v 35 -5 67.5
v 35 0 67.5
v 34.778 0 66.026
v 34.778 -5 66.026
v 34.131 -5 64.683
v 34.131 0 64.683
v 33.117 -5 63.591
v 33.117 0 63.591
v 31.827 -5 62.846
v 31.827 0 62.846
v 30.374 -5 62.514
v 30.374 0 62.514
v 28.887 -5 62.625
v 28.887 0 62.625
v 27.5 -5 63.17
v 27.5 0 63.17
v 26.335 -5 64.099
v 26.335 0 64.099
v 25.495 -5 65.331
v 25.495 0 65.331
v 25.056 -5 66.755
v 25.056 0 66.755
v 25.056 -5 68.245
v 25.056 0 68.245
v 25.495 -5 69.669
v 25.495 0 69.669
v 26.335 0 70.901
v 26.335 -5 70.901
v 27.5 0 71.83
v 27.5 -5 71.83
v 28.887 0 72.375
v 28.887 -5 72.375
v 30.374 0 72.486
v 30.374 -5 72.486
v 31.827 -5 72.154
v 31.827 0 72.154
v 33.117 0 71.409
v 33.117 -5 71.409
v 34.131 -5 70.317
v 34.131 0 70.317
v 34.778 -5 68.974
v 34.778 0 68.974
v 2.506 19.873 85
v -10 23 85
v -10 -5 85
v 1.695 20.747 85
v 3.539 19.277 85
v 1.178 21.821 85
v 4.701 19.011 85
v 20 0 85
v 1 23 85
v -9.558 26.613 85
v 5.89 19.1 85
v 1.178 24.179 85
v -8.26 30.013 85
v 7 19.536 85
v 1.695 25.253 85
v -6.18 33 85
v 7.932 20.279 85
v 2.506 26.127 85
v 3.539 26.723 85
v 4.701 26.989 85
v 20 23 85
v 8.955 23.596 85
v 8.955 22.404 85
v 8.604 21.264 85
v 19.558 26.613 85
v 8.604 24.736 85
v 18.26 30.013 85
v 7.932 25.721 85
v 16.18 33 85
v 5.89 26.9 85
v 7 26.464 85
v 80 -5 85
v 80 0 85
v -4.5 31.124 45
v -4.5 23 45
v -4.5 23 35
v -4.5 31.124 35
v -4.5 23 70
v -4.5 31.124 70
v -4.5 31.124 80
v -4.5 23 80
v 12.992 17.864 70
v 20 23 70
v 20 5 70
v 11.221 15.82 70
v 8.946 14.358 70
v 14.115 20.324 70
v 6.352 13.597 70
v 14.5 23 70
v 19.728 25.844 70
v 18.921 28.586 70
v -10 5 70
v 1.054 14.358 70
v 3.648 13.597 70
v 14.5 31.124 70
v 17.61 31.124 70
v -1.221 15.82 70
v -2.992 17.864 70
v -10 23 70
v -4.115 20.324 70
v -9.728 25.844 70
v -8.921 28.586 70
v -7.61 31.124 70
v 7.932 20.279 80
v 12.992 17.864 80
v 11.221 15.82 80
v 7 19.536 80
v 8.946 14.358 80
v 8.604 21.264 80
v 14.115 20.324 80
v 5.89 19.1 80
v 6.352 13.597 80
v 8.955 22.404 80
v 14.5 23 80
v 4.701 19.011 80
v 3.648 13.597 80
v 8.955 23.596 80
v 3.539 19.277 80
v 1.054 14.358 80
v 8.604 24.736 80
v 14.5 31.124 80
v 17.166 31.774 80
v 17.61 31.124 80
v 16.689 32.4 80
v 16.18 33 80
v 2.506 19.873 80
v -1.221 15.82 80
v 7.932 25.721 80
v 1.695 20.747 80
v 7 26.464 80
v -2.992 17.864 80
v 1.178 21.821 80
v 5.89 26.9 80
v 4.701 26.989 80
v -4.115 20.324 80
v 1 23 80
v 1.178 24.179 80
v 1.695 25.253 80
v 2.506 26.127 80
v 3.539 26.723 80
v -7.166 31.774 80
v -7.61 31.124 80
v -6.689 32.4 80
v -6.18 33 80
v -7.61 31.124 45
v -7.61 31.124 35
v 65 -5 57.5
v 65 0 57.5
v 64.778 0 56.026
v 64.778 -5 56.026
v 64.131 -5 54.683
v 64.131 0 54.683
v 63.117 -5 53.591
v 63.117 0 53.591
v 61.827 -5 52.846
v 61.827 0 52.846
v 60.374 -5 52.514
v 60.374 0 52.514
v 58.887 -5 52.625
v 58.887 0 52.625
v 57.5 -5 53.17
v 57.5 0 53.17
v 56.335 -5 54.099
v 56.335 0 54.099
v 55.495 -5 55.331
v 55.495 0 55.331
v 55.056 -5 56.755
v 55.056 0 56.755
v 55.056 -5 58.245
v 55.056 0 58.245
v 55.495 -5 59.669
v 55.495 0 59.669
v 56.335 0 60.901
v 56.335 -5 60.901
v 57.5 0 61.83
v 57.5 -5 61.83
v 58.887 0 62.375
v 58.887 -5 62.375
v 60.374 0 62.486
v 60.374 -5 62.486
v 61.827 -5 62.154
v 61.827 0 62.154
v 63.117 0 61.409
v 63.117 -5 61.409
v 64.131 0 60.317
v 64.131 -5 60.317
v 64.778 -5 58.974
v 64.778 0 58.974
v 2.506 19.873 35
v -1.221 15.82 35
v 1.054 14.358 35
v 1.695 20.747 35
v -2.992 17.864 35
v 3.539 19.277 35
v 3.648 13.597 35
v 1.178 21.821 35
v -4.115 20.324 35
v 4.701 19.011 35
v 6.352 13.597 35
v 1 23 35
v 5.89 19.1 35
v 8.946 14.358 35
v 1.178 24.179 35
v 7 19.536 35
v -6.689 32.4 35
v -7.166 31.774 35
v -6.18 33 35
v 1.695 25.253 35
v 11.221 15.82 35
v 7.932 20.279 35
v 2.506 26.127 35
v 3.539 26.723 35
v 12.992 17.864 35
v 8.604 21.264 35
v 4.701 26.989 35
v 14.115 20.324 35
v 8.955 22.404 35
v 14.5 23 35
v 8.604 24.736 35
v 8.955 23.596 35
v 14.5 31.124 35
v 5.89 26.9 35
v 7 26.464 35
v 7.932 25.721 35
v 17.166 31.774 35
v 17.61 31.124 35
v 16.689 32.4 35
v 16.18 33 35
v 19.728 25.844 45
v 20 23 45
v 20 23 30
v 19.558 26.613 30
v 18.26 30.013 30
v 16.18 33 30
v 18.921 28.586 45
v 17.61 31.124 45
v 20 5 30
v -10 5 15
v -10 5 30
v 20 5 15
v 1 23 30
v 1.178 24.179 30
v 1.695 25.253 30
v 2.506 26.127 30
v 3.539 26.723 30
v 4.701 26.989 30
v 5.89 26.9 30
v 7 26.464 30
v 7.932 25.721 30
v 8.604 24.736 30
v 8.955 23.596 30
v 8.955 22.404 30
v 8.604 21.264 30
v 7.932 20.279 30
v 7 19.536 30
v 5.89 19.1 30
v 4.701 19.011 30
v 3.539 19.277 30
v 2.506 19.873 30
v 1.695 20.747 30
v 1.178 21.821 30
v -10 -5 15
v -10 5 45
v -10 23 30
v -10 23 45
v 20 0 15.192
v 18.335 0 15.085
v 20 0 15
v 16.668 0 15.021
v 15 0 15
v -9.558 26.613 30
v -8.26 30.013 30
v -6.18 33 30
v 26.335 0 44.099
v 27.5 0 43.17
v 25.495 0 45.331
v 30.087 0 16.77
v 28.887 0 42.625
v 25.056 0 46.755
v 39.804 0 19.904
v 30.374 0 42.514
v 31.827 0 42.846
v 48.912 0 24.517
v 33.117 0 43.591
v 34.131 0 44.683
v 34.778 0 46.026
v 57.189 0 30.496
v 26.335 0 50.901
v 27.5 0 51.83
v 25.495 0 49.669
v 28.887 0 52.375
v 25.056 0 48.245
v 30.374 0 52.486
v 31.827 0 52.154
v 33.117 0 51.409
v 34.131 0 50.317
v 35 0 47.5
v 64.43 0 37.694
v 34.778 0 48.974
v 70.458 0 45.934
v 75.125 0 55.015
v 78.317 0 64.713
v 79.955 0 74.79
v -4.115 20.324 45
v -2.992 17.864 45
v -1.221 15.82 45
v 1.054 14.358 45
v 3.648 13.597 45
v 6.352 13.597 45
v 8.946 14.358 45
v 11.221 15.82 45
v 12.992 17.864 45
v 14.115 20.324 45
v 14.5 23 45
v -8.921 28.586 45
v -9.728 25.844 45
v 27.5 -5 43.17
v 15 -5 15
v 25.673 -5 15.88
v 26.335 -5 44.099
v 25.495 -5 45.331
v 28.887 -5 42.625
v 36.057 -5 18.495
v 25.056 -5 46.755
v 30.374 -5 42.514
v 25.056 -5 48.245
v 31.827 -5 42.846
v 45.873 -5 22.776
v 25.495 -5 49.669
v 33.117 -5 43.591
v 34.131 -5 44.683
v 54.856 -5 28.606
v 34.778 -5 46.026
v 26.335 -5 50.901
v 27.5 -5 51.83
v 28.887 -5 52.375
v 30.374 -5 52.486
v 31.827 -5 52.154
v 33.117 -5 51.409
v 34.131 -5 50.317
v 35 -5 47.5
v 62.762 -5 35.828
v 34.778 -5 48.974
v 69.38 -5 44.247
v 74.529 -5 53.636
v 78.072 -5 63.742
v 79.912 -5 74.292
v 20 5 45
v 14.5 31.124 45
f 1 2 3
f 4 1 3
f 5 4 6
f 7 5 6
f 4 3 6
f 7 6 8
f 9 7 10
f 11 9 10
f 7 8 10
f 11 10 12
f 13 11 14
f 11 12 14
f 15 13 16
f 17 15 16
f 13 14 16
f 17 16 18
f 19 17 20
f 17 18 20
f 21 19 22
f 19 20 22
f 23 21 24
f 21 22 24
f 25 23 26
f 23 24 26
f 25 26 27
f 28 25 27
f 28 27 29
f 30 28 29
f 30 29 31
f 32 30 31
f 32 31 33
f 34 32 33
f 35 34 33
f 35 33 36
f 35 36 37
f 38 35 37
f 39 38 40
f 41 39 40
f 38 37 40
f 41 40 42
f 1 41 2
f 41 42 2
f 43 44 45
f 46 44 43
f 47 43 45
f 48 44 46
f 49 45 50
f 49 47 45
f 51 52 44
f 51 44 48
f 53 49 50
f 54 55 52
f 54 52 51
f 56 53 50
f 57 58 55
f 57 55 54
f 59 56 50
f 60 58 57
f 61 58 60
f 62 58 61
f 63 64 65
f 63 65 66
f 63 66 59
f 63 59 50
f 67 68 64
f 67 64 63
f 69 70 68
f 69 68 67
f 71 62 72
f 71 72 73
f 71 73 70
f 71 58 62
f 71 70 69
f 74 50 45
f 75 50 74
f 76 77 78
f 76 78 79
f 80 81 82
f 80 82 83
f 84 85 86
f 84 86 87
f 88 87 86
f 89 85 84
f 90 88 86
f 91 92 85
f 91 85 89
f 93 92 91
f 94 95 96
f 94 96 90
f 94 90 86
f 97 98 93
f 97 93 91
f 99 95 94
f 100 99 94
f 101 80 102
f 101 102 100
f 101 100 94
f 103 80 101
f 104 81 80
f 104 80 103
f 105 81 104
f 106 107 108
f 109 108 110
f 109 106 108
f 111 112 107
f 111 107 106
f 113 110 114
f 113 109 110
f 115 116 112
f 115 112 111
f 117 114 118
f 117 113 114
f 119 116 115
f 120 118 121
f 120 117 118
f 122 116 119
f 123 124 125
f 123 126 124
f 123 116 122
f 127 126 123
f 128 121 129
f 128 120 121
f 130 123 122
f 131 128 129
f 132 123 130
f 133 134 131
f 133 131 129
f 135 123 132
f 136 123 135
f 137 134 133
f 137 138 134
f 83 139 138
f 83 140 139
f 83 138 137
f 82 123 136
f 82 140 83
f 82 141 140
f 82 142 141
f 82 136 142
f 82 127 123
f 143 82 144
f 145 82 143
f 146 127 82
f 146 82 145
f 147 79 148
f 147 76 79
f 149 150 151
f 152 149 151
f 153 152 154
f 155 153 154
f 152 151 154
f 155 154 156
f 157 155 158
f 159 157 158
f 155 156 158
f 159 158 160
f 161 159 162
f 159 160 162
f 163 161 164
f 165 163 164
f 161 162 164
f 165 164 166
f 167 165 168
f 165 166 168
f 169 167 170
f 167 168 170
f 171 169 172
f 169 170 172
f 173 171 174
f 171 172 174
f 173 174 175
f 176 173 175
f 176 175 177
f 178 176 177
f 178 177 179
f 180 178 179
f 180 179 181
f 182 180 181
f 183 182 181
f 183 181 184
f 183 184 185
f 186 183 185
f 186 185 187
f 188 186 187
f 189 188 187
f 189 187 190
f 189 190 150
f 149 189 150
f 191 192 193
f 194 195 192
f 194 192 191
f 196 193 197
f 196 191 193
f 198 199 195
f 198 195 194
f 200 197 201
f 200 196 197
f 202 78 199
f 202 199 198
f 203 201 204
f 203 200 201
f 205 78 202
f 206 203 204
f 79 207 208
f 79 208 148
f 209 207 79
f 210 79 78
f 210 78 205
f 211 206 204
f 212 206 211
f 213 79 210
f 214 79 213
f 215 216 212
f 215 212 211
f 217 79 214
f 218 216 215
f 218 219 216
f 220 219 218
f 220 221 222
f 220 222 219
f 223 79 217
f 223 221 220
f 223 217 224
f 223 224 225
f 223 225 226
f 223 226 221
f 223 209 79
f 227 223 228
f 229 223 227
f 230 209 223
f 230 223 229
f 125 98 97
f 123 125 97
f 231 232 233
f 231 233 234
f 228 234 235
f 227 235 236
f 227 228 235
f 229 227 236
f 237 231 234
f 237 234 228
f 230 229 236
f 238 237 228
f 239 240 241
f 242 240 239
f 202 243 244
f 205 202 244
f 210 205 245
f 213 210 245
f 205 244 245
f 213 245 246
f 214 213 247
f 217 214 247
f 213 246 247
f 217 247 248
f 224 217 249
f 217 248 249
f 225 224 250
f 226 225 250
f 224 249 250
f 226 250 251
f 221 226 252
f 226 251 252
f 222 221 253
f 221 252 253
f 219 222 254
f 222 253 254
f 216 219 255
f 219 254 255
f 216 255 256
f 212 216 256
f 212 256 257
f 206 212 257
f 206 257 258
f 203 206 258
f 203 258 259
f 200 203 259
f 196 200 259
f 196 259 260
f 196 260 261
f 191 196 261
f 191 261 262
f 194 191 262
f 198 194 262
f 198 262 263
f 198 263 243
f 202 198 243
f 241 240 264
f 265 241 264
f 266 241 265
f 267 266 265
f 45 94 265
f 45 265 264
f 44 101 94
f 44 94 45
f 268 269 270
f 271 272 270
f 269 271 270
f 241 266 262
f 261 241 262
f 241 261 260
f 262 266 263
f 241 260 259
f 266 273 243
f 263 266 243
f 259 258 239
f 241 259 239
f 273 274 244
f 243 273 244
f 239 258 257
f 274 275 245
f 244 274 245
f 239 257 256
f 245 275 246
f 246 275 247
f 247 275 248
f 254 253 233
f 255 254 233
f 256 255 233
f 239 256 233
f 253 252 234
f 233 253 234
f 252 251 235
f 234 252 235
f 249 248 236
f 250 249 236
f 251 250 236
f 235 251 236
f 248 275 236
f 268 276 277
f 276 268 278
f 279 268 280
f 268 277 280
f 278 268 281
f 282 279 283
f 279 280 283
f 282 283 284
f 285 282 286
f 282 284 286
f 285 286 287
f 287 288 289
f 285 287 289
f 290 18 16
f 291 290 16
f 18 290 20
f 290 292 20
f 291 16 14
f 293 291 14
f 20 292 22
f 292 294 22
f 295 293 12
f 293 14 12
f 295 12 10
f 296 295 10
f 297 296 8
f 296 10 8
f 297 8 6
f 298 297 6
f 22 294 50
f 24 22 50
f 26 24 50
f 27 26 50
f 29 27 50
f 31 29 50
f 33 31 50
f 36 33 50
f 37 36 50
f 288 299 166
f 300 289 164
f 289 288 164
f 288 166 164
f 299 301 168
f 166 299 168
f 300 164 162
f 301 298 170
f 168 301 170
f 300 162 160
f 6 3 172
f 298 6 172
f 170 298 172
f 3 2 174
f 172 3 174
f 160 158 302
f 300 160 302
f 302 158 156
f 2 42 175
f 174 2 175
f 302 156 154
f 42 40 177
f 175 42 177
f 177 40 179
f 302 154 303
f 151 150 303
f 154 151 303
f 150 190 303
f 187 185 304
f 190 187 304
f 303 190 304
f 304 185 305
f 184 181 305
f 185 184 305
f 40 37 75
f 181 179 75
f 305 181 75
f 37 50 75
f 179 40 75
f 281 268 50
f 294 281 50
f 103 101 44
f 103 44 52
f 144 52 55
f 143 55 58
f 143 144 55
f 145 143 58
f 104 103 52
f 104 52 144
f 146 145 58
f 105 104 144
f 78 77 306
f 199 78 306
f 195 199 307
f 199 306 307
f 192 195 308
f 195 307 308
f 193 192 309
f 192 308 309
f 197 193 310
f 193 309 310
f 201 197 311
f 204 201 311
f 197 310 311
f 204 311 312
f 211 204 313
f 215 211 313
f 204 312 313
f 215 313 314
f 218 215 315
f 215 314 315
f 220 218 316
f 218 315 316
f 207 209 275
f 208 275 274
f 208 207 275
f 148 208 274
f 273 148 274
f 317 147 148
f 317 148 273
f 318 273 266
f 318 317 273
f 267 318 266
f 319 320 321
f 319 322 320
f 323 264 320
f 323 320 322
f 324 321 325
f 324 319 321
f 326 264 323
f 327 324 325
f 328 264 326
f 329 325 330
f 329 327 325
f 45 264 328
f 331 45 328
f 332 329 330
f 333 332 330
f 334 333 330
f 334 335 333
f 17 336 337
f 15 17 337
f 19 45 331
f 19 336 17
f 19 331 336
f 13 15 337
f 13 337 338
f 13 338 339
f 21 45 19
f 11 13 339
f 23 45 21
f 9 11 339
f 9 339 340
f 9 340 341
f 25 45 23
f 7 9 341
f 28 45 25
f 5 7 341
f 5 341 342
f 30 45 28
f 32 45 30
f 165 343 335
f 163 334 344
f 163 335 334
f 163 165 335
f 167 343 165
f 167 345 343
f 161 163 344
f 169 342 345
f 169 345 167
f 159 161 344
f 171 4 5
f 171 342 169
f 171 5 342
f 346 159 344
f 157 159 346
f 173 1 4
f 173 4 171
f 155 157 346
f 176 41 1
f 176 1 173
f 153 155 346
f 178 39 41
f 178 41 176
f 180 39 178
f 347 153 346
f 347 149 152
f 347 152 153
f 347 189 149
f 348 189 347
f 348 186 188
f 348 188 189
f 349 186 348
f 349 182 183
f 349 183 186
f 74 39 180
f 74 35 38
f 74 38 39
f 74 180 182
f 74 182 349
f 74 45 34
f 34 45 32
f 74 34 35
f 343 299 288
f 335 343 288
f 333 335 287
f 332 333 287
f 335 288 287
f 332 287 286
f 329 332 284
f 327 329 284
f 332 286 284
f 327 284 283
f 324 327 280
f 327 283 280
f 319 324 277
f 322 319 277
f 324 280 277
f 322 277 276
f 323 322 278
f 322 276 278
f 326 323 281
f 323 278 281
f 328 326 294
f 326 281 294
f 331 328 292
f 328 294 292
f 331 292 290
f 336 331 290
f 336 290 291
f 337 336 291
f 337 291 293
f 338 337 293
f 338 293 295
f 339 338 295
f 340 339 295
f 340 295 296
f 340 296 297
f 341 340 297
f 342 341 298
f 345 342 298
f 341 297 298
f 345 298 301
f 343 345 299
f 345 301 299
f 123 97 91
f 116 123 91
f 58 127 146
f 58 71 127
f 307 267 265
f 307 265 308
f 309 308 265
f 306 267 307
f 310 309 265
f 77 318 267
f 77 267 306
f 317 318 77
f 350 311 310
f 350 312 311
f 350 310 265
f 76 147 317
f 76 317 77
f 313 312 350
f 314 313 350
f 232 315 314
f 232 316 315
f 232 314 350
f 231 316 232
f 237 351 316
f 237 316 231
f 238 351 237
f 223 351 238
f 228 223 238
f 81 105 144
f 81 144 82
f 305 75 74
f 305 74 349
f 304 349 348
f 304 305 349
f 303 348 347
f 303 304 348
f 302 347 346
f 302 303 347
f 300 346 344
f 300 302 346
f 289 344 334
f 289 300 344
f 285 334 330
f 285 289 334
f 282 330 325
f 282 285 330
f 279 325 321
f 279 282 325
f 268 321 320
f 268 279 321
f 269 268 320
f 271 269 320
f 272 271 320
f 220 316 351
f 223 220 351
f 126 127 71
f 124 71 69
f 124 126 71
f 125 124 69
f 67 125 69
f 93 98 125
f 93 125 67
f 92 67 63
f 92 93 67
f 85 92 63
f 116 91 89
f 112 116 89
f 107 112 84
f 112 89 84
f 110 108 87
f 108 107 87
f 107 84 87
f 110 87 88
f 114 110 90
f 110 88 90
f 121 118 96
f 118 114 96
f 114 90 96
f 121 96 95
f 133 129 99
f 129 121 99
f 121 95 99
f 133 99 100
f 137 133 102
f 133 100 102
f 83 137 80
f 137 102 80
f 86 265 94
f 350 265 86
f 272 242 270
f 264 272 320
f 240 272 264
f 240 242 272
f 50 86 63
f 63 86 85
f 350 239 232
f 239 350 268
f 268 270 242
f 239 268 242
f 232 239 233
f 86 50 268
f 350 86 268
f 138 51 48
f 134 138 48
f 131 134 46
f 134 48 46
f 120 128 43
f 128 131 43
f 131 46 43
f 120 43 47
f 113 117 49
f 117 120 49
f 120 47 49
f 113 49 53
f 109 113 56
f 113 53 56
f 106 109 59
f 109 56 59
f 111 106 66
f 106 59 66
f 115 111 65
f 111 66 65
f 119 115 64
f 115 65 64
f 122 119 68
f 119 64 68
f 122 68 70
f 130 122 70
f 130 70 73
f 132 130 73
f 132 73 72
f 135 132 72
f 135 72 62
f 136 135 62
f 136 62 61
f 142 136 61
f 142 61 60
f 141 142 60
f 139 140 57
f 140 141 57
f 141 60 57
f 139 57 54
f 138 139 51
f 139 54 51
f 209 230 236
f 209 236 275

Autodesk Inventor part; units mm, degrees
ref_plane "Work Plane12" through (0, 0, 0) normal (0, 1, 0) x (1, 0, 0)
sketch "Sketch2" plane through (0, 0, 0) normal (0, 1, 0) x (1, 0, 0)
  line L0 (-10, -65) -> (-10, -85)
  line L1 (-10, -85) -> (20, -85)
  line L2 (-10, -50) -> (-10, -15)
  line L3 (17.5697, -20.0796) -> (74.4447, -85.0796) construction
  line L4 (80.25, -80) -> (80.25, -36.3042) construction
  line L5 (-10, -65) -> (-10, -50)
  arc A0 (80.25, -80) -> (23.375, -15) centre (15.252, -79.4904) ccw projected
  line L6 (20, -85) -> (20, -15)
  line L7 (20, -85) -> (90, -85) construction
  line L8 (20, -15) -> (-10, -15)
  point P0 (0, -80)
  point P1 (0, 0)
  dimension "d13" = 30
  dimension "d14" = 20
  dimension "d15" = 35
  dimension "d98" = 70
  dimension "d99" = 90
extrude "Extrusion2" add sketch "Sketch2" along normal blind 5
ref_plane "Work Plane7" through (0, 5, 0) normal (0, 1, 0) x (1, 0, 0)
ref_plane "Work Plane6" through (0, 5, 0) normal (0, 1, 0) x (1, 0, 0)
sketch "Sketch7" plane through (0, 5, 0) normal (0, 1, 0) x (1, 0, 0)
  line L0 (-2.5, -32.5) -> (7.5, -32.5) projected
  line L1 (2.5, -32.5) -> (15, -75.625) construction
  line L2 (15, -85) -> (15, -65) projected
  line L3 (-2.5, -45) -> (7.5, -45) projected
  line L4 (2.5, -45) -> (2.5, -70) construction
  line L5 (2.5, -57.5) -> (-13.1217, -57.5) construction
  point P0 (0, 0)
  point P1 (20, -85)
  dimension "d54" = 25
ref_plane "Work Plane8" through (-2.5, 5, 45) normal (0, 0, 1) x (1, 0, 0)
sketch "Sketch8" plane through (-2.5, 5, 45) normal (0, 0, 1) x (1, 0, 0)
  line L0 (-7.5, 0) -> (22.5, 0) projected
  arc A0 (22.5, 18) -> (-7.5, 18) centre (7.5, 18) ccw
  line L1 (-7.5, 18) -> (-7.5, 0)
  line L2 (22.5, 18) -> (22.5, 0)
  point P0 (2.5, -5)
  dimension "d100" = 30
extrude "Extrusion7" add sketch "Sketch8" against normal blind 15
ref_plane "Work Plane9" through (-2.5, 5, 45) normal (0, 0, 1) x (1, 0, 0)
sketch "Sketch9" plane through (-2.5, 5, 45) normal (0, 0, 1) x (1, 0, 0)
  arc A0 (-2, 18) -> (17, 18) centre (7.5, 18) ccw
  line L0 (-2, 18) -> (-2, 26.124)
  line L1 (17, 18) -> (17, 26.124)
  line L2 (22.5, 0) -> (-7.5, 0) construction
  line L3 (7.5, 0) -> (7.5, 18) construction
  arc A1 (22.5, 18) -> (-7.5, 18) centre (7.5, 18) ccw construction
  line L4 (17, 26.124) -> (20.1095, 26.124)
  line L5 (-2, 26.124) -> (-5.1095, 26.124)
  arc A2 (20.1095, 26.124) -> (-5.1095, 26.124) centre (7.5, 18) ccw
  point P0 (2.5, -5)
  dimension "d47" = 19
extrude "Extrusion8" cut sketch "Sketch9" against normal blind 10
ref_plane "Work Plane10" through (2.5, 23, 30) normal (0, 0, -1) x (-1, 0, 0)
sketch "Sketch10" plane through (2.5, 23, 30) normal (0, 0, -1) x (-1, 0, 0)
  line L0 (-5, 0) -> (5, 0) projected
  arc A0 (-12, 0) -> (7, 0) centre (-2.5, 0) ccw projected
  circle A1 centre (-2.5, 0) radius 4
  point P0 (2.5, -23)
  dimension "d103" = 8
extrude "Extrusion9" cut sketch "Sketch10" against normal blind 5
ref_plane "Work Plane2" through (2.5, 5, 57.5) normal (0, 0, 1) x (1, 0, 0)
mirror "Mirror2" about plane through (2.5, 5, 57.5) normal (0, 0, 1) of "Extrusion7", "Extrusion8", "Extrusion9"
ref_plane "Work Plane11" through (2.5, 23, 85) normal (0, 0, 1) x (1, 0, 0)
sketch "Sketch11" plane through (2.5, 23, 85) normal (0, 0, 1) x (1, 0, 0)
  line L0 (-12.5, 20) -> (17.5, 20)
  line L1 (17.5, 20) -> (17.5, 10)
  line L2 (17.5, 10) -> (-12.5, 10)
  line L3 (-12.5, 10) -> (-12.5, 20)
  arc A0 (17.5, 0) -> (-12.5, 0) centre (2.5, 0) ccw projected
  line L4 (-12.5, 20) -> (17.5, 10) construction
  line L5 (17.5, 20) -> (-12.5, 10) construction
  point P0 (-2.5, -23)
  point P1 (2.5, 15)
  dimension "d101" = 30
  dimension "d102" = 10
extrude "Extrusion10" cut sketch "Sketch11" against normal blind 80
ref_plane "Work Plane14" through (0, 0, 0) normal (0, -1, 0) x (1, 0, 0)
sketch "Sketch17" plane through (0, 0, 0) normal (0, -1, 0) x (1, 0, 0)
  line L0 (15, 15) -> (-10, 15) projected
  line L1 (-10, 15) -> (15, 15)
  line L2 (-10, 15) -> (-10, 30) projected
  line L3 (-10, 15) -> (-10, 85)
  line L4 (-10, 85) -> (80, 85)
  arc A0 (15, 15) -> (80, 85) centre (15, 80.1786) ccw
  point P0 (0, 0)
  dimension "d94" = 90
extrude "Extrusion16" add sketch "Sketch17" along normal blind 5
sketch "Sketch18" plane through (0, 0, 0) normal (0, 1, 0) x (1, 0, 0)
  line L0 (20, -70) -> (20, -45) construction
  line L1 (20, -57.5) -> (60, -57.5) construction
  line L2 (20, -57.5) -> (30, -57.5) construction
  line L3 (30, -57.5) -> (30, -37.5) construction
  line L4 (30, -57.5) -> (30, -77.5) construction
  circle A0 centre (30, -67.5) radius 5
  circle A1 centre (30, -47.5) radius 5
  circle A2 centre (60, -57.5) radius 5
  point P0 (0, 0)
  dimension "d104" = 40
  dimension "d105" = 10
  dimension "d106" = 20
  dimension "d107" = 20
  dimension "d108" = 10
  dimension "d109" = 10
  dimension "d110" = 10
extrude "Extrusion17" cut sketch "Sketch18" against normal blind 5
properties part number "beta_plate"
